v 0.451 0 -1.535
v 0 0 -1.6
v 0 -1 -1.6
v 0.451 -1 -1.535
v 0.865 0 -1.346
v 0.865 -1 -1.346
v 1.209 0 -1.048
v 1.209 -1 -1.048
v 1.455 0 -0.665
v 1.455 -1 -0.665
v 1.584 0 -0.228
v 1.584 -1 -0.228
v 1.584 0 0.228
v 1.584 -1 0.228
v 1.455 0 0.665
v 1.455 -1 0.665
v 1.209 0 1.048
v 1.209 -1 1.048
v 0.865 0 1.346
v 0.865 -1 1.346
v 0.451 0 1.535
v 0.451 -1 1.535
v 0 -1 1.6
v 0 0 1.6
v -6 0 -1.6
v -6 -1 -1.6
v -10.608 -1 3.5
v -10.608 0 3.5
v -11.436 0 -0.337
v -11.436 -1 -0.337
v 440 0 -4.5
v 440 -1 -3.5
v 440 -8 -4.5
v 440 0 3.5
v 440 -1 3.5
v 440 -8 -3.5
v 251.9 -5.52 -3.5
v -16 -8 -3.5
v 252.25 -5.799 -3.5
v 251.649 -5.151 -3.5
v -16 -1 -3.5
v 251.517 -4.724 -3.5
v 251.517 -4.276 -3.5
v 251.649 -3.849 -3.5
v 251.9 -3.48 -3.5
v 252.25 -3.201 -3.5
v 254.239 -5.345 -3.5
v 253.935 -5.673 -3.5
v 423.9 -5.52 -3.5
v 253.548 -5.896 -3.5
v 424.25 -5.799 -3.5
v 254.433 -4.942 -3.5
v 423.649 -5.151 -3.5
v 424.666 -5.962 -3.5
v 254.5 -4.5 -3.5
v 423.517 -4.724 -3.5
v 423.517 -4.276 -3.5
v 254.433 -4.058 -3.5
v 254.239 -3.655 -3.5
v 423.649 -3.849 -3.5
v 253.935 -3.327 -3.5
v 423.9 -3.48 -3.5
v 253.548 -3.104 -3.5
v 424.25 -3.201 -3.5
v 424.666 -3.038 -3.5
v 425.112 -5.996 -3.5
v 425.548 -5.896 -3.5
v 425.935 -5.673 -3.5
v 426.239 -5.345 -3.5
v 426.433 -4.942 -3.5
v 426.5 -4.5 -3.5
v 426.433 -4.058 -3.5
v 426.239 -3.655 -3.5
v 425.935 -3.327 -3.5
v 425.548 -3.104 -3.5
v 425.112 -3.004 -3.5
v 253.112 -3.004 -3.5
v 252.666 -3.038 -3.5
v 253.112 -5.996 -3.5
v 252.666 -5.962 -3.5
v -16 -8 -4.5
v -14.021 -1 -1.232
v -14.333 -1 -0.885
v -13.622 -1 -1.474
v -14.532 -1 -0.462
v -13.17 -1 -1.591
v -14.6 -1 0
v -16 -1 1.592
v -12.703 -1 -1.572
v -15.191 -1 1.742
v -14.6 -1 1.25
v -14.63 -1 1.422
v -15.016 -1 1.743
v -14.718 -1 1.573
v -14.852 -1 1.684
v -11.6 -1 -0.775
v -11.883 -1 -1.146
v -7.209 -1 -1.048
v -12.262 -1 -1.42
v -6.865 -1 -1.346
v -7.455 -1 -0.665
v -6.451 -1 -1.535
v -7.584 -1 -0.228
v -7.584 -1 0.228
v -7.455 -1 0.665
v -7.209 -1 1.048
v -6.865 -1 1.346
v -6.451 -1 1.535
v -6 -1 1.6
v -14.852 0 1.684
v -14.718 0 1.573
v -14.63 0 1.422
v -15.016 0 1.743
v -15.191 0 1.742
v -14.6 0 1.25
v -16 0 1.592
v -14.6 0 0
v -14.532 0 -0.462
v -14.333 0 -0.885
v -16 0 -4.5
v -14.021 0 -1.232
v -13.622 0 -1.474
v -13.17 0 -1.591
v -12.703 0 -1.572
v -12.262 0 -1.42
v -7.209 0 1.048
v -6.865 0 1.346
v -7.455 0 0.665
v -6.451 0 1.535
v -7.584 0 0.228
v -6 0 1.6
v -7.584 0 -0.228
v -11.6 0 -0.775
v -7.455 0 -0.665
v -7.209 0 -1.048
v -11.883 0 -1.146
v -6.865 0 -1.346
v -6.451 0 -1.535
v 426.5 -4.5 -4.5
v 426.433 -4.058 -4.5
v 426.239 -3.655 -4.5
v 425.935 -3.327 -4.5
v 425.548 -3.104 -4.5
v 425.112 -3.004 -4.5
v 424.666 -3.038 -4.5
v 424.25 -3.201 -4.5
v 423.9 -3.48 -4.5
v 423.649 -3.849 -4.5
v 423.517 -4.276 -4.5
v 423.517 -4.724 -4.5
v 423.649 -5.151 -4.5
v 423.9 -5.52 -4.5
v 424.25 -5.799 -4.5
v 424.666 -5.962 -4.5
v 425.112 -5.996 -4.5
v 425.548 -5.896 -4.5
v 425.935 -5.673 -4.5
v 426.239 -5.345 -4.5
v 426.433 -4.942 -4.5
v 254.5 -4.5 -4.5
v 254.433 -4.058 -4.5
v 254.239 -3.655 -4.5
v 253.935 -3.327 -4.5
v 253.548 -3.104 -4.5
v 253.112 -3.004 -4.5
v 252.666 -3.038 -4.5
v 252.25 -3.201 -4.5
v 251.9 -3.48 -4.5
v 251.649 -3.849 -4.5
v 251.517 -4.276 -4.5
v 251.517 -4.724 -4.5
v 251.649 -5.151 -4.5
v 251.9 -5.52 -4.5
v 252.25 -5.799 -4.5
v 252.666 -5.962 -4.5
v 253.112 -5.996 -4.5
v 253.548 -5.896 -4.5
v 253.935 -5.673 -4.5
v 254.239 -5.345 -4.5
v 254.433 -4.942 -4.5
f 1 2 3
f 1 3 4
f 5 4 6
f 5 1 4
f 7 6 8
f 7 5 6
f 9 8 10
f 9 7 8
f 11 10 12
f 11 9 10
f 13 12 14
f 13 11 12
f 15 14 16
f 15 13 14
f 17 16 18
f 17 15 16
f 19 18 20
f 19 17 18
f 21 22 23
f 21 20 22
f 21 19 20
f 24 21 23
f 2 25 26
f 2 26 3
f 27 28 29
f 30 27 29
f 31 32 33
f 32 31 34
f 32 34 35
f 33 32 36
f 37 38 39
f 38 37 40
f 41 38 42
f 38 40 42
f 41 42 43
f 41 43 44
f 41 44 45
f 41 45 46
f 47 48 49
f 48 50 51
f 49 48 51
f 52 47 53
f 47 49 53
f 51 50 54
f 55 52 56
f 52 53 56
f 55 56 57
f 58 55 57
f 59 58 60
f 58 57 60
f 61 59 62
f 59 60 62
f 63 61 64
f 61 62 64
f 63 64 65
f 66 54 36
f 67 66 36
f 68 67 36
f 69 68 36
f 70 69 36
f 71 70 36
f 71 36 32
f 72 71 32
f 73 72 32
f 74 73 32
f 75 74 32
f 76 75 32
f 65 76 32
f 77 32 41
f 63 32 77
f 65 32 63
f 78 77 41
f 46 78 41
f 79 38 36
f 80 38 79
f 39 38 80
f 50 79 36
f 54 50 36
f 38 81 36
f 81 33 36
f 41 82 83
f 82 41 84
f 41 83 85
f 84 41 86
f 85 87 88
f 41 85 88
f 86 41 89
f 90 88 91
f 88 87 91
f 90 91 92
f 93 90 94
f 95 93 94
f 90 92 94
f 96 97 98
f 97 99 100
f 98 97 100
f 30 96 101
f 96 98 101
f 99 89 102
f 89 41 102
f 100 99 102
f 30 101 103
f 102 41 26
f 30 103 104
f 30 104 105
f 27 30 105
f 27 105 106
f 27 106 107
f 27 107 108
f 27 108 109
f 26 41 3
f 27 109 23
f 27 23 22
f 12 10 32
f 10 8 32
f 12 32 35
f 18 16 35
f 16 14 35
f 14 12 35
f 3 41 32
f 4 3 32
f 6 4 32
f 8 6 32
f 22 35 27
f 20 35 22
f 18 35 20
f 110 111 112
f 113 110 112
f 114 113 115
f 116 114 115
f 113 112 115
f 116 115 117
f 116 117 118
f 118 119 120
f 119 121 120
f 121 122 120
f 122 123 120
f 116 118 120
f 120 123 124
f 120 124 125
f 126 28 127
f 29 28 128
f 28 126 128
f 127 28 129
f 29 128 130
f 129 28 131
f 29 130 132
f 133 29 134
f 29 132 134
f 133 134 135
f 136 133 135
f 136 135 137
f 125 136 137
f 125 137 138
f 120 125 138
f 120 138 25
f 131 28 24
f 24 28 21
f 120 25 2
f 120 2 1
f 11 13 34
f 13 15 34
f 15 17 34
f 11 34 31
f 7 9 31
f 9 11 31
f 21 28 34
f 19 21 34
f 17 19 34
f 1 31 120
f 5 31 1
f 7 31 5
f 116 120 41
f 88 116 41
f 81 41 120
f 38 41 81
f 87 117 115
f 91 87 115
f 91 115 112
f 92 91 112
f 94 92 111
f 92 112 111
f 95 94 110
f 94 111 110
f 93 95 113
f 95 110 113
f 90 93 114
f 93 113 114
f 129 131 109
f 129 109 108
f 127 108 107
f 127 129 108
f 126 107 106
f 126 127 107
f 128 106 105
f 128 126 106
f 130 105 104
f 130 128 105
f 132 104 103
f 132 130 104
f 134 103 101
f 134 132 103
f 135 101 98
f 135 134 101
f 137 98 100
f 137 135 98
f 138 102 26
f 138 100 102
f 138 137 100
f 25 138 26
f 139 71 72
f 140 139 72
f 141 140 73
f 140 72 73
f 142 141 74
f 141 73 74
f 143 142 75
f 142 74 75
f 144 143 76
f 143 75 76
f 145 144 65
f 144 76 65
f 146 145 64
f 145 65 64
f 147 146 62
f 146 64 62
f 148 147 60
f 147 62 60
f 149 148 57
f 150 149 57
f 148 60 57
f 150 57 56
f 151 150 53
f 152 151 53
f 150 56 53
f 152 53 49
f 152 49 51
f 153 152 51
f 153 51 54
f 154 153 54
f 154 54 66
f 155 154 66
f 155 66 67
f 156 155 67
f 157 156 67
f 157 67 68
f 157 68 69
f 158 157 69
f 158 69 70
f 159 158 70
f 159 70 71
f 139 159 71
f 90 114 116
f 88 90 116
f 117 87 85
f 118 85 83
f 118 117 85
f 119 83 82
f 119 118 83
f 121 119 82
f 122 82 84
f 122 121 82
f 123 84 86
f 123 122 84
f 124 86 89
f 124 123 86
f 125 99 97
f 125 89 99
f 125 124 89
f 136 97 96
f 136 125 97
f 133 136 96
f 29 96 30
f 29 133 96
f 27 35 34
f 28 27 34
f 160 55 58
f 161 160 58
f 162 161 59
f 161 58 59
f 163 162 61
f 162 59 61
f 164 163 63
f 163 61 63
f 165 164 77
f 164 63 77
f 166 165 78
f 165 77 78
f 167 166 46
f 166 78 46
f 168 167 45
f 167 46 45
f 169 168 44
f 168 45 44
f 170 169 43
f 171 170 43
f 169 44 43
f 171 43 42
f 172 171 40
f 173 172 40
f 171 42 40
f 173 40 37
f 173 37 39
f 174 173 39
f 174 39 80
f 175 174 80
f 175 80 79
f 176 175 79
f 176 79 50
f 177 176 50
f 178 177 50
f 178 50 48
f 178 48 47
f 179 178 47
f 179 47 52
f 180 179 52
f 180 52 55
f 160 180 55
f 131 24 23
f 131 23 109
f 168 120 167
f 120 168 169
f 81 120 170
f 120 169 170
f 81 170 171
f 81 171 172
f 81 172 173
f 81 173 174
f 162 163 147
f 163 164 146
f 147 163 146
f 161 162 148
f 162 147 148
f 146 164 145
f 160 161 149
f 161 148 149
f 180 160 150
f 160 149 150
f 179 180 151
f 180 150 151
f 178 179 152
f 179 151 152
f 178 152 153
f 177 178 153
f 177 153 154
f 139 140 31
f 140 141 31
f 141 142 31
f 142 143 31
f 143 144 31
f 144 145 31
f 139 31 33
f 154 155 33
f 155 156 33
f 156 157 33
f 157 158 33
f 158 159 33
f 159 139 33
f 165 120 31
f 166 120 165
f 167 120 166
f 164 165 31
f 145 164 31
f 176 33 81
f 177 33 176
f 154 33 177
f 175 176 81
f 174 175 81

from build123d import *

# Parameters (mm, degrees)
PAD017_DEPTH      = 440
PAD017_DEPTH_BACK = 16
POCKET018_DEPTH   = 5
SKETCH055_R       = 1.5
POCKET019_DEPTH   = 5


with BuildPart() as part:
    # Sketch053 → Pad017 (new body, two sides)
    with BuildSketch(Plane.YZ) as pad017_sk:
        Polygon((0, -4.5), (-8, -4.5), (-8, -3.5), (-1, -3.5), (-1, 3.5), (0, 3.5), align=None)
    extrude(amount=PAD017_DEPTH)
    extrude(pad017_sk.sketch, amount=-PAD017_DEPTH_BACK)

    # Sketch054 → Pocket018 (cut)
    with BuildSketch(Plane.XZ):
        with BuildLine():
            ThreePointArc((-6, 1.6), (-7.6, 0), (-6, -1.6))
            Line((-6, -1.6), (0, -1.6))
            ThreePointArc((0, -1.6), (1.6, 0), (0, 1.6))
            Line((0, 1.6), (-6, 1.6))
        make_face()
        with BuildLine():
            Line((-16.5, 4), (-10.5, 4))
            Line((-10.5, 4), (-11.4360006338, -0.3374996039))
            ThreePointArc((-14.6, 0), (-13.1697071214, -1.5909743848), (-11.4360006338, -0.3374996039))
            Line((-14.6, 0), (-14.6, 1.25))
            ThreePointArc((-14.6, 1.25), (-14.7801442911, 1.6343075923), (-15.1907693019, 1.7416919095))
            Line((-15.1907693019, 1.7416919095), (-16.5, 1.5))
            Line((-16.5, 1.5), (-16.5, 4))
        make_face()
    extrude(amount=POCKET018_DEPTH, mode=Mode.SUBTRACT)

    # Sketch055 → Pocket019 (cut)
    with BuildSketch(Plane.XY):
        with Locations((425, -4.5)):
            Circle(SKETCH055_R)
        with Locations((253, -4.5)):
            Circle(SKETCH055_R)
    extrude(amount=-POCKET019_DEPTH, mode=Mode.SUBTRACT)


solid = part.part
